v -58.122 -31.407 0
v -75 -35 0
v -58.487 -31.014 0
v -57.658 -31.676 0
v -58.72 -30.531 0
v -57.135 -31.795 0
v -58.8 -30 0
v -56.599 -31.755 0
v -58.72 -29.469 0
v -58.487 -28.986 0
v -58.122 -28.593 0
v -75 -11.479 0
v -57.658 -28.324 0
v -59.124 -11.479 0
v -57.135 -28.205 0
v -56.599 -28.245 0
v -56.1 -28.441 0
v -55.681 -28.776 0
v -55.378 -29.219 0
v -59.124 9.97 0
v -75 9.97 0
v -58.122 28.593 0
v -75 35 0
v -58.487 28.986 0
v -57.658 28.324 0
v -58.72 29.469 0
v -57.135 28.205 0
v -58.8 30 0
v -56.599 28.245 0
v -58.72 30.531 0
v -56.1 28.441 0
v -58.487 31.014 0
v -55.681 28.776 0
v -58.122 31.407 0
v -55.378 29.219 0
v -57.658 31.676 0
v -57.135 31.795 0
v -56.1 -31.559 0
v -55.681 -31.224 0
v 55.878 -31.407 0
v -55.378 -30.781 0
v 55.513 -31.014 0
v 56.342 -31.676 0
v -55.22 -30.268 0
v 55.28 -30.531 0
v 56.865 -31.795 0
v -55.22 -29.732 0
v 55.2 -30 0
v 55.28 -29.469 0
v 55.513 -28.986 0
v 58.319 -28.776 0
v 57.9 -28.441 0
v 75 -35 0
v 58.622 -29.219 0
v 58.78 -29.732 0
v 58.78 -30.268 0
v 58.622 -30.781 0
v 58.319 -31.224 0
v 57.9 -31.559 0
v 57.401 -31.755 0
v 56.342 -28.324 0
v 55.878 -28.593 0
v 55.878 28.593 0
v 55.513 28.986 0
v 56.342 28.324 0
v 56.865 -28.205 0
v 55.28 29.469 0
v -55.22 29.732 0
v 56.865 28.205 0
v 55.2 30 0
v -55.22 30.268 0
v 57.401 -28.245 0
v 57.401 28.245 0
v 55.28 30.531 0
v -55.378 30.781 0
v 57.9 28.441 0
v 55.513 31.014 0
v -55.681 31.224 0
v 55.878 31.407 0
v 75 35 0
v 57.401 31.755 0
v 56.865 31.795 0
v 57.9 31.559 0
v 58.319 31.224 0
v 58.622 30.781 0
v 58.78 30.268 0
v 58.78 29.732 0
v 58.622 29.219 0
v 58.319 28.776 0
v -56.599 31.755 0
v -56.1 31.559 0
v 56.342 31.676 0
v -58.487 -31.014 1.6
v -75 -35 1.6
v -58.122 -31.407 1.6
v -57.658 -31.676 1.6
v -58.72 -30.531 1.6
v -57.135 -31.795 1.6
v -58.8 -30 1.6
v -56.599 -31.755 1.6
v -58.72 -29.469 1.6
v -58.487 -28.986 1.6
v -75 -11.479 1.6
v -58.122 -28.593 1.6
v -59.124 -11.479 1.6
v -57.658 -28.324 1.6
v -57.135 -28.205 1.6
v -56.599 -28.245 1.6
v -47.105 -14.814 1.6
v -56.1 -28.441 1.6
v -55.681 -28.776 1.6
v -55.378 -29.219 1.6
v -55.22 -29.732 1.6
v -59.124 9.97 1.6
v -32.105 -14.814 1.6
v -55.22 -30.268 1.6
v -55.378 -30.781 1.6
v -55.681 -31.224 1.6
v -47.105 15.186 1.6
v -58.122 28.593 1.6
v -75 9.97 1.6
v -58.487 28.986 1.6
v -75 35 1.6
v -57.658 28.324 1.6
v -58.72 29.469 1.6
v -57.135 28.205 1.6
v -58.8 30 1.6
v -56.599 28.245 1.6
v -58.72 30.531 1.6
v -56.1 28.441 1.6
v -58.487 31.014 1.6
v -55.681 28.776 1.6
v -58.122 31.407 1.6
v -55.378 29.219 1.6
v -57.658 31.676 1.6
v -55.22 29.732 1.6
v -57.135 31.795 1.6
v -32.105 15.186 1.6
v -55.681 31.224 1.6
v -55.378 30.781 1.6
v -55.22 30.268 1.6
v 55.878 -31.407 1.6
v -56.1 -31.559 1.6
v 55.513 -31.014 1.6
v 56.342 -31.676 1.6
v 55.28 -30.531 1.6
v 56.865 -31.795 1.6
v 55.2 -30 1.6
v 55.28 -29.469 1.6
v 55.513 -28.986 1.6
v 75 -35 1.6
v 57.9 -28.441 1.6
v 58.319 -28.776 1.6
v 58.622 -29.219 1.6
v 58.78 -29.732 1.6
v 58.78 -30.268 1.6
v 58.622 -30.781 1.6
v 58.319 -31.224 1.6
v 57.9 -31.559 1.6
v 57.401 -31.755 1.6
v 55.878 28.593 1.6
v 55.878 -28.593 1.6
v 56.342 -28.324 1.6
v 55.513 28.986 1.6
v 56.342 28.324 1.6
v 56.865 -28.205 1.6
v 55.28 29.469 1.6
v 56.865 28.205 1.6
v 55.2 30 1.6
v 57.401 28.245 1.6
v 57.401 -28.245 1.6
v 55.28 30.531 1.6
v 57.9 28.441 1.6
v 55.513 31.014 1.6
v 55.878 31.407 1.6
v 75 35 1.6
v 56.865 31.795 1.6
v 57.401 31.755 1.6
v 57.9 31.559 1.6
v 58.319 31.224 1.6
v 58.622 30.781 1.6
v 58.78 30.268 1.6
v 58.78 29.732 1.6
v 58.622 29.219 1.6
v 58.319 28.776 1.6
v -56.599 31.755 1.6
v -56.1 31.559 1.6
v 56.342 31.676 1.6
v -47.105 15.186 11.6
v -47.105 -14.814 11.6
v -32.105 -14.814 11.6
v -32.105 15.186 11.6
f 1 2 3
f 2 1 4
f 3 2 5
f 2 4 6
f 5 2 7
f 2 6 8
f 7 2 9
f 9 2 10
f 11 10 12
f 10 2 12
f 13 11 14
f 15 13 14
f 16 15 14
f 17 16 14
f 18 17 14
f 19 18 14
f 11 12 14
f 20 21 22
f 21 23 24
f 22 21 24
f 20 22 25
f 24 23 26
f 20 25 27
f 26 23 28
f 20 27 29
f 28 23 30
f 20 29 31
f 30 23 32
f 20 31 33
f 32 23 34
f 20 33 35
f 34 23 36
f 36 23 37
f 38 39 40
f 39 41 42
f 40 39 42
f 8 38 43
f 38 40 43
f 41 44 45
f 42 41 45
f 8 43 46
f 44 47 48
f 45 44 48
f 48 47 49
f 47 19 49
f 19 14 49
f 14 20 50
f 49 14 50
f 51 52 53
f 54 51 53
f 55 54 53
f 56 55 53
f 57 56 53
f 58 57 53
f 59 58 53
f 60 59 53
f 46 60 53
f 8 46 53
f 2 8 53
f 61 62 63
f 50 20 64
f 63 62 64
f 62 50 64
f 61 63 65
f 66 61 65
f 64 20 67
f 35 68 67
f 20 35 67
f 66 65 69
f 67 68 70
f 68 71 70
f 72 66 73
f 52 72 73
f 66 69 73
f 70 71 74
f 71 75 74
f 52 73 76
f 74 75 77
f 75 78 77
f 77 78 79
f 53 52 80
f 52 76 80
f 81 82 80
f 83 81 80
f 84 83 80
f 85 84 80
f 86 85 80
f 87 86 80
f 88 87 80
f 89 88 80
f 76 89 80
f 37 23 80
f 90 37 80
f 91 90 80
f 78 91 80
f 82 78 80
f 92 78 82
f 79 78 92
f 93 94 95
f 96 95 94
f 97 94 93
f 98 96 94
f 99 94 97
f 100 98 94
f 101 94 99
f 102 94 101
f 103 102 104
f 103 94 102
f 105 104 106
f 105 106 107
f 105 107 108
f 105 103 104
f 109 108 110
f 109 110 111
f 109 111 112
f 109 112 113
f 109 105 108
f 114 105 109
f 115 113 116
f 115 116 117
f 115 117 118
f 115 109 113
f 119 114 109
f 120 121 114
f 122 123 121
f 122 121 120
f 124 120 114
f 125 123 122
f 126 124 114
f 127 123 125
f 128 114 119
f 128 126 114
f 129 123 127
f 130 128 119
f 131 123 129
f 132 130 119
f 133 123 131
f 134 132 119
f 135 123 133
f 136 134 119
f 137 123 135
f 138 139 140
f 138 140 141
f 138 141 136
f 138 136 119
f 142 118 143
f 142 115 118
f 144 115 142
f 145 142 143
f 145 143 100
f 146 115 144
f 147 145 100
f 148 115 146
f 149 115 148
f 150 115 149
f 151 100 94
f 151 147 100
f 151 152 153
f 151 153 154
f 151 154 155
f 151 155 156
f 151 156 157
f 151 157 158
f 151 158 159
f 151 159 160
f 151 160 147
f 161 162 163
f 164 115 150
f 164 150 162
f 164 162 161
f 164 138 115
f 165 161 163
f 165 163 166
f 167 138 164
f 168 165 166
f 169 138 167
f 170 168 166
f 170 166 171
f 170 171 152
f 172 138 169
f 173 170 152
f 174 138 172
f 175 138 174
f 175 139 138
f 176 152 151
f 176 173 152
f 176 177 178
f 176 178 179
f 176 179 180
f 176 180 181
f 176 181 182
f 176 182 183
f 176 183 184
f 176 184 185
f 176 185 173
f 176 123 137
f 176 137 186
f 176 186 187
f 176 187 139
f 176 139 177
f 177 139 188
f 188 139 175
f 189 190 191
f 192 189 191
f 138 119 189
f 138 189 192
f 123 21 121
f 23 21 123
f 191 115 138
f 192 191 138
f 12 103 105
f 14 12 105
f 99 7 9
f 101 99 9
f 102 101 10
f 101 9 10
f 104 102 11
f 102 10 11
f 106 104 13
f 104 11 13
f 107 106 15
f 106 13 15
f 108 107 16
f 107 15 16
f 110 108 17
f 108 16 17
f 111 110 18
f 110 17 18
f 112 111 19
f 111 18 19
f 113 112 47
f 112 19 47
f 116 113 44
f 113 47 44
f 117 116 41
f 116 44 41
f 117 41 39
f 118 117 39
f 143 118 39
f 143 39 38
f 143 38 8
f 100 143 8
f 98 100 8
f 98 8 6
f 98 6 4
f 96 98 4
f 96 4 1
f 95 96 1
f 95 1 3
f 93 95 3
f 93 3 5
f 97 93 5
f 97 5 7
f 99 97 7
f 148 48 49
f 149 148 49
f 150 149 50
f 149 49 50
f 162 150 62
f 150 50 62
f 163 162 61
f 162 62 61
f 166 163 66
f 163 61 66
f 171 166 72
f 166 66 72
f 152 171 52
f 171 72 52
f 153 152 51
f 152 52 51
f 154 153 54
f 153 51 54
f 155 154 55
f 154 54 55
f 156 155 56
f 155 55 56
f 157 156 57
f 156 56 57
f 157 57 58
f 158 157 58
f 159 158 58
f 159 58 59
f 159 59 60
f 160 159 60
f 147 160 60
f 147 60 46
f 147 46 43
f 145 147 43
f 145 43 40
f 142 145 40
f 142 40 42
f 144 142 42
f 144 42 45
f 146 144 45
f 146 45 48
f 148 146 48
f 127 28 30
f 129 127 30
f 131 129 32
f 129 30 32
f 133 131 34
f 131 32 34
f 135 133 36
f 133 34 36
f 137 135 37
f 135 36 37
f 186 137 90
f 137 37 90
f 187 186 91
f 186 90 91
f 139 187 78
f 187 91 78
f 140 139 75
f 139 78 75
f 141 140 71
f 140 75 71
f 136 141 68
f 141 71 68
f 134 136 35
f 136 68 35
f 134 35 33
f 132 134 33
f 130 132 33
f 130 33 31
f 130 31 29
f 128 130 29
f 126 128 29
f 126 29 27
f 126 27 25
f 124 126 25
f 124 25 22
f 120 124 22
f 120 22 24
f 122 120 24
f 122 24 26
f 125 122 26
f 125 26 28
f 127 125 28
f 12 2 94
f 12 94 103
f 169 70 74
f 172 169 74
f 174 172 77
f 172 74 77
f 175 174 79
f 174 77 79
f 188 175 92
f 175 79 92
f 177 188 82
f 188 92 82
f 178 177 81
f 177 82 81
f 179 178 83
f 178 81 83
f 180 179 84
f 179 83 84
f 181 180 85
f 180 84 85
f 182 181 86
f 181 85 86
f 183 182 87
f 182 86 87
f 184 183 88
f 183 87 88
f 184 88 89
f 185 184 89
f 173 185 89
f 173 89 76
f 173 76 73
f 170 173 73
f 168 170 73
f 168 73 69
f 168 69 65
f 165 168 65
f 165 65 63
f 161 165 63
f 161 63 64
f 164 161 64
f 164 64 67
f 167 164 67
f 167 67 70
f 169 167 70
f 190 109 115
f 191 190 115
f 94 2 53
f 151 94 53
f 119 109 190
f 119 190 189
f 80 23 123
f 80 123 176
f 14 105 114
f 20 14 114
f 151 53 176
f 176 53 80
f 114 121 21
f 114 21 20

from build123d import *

# Parameters (mm, degrees)
SKETCH_1_W          = 150
SKETCH_1_H          = 70
EXTRUDE_1_DEPTH     = 1.6
HOLE_WIZARD_M3_1_D  = 3.6
SKETCH_5_W          = 35.774901566
SKETCH_5_H          = 21.448543783
CUT_EXTRUDE_1_DEPTH = 10
SKETCH_6_W          = 15
SKETCH_6_H          = 30
EXTRUDE_2_DEPTH     = 10


with BuildPart() as part:
    # ｽｹｯﾁ1 → ﾎﾞｽ - 押し出し1 (new body)
    with BuildSketch(Plane.XY):
        Rectangle(SKETCH_1_W, SKETCH_1_H)
    extrude(amount=EXTRUDE_1_DEPTH)

    # M3 すきま穴1 (through all)
    with Locations(Plane.XY.offset(1.6)):
        with Locations((57, 30), (57, -30), (-57, -30), (-57, 30)):
            Hole(HOLE_WIZARD_M3_1_D / 2)

    # ｽｹｯﾁ5 → ｶｯﾄ - 押し出し1 (cut)
    with BuildSketch(Plane.XY.offset(1.6)):
        with Locations((-77.011061726, -0.754700365)):
            Rectangle(SKETCH_5_W, SKETCH_5_H)
    extrude(amount=-CUT_EXTRUDE_1_DEPTH, mode=Mode.SUBTRACT)

    # ｽｹｯﾁ6 → ﾎﾞｽ - 押し出し2 (add)
    with BuildSketch(Plane.XY.offset(1.6)):
        with Locations((-39.605094466, 0.185984115)):
            Rectangle(SKETCH_6_W, SKETCH_6_H)
    extrude(amount=EXTRUDE_2_DEPTH)


solid = part.part
